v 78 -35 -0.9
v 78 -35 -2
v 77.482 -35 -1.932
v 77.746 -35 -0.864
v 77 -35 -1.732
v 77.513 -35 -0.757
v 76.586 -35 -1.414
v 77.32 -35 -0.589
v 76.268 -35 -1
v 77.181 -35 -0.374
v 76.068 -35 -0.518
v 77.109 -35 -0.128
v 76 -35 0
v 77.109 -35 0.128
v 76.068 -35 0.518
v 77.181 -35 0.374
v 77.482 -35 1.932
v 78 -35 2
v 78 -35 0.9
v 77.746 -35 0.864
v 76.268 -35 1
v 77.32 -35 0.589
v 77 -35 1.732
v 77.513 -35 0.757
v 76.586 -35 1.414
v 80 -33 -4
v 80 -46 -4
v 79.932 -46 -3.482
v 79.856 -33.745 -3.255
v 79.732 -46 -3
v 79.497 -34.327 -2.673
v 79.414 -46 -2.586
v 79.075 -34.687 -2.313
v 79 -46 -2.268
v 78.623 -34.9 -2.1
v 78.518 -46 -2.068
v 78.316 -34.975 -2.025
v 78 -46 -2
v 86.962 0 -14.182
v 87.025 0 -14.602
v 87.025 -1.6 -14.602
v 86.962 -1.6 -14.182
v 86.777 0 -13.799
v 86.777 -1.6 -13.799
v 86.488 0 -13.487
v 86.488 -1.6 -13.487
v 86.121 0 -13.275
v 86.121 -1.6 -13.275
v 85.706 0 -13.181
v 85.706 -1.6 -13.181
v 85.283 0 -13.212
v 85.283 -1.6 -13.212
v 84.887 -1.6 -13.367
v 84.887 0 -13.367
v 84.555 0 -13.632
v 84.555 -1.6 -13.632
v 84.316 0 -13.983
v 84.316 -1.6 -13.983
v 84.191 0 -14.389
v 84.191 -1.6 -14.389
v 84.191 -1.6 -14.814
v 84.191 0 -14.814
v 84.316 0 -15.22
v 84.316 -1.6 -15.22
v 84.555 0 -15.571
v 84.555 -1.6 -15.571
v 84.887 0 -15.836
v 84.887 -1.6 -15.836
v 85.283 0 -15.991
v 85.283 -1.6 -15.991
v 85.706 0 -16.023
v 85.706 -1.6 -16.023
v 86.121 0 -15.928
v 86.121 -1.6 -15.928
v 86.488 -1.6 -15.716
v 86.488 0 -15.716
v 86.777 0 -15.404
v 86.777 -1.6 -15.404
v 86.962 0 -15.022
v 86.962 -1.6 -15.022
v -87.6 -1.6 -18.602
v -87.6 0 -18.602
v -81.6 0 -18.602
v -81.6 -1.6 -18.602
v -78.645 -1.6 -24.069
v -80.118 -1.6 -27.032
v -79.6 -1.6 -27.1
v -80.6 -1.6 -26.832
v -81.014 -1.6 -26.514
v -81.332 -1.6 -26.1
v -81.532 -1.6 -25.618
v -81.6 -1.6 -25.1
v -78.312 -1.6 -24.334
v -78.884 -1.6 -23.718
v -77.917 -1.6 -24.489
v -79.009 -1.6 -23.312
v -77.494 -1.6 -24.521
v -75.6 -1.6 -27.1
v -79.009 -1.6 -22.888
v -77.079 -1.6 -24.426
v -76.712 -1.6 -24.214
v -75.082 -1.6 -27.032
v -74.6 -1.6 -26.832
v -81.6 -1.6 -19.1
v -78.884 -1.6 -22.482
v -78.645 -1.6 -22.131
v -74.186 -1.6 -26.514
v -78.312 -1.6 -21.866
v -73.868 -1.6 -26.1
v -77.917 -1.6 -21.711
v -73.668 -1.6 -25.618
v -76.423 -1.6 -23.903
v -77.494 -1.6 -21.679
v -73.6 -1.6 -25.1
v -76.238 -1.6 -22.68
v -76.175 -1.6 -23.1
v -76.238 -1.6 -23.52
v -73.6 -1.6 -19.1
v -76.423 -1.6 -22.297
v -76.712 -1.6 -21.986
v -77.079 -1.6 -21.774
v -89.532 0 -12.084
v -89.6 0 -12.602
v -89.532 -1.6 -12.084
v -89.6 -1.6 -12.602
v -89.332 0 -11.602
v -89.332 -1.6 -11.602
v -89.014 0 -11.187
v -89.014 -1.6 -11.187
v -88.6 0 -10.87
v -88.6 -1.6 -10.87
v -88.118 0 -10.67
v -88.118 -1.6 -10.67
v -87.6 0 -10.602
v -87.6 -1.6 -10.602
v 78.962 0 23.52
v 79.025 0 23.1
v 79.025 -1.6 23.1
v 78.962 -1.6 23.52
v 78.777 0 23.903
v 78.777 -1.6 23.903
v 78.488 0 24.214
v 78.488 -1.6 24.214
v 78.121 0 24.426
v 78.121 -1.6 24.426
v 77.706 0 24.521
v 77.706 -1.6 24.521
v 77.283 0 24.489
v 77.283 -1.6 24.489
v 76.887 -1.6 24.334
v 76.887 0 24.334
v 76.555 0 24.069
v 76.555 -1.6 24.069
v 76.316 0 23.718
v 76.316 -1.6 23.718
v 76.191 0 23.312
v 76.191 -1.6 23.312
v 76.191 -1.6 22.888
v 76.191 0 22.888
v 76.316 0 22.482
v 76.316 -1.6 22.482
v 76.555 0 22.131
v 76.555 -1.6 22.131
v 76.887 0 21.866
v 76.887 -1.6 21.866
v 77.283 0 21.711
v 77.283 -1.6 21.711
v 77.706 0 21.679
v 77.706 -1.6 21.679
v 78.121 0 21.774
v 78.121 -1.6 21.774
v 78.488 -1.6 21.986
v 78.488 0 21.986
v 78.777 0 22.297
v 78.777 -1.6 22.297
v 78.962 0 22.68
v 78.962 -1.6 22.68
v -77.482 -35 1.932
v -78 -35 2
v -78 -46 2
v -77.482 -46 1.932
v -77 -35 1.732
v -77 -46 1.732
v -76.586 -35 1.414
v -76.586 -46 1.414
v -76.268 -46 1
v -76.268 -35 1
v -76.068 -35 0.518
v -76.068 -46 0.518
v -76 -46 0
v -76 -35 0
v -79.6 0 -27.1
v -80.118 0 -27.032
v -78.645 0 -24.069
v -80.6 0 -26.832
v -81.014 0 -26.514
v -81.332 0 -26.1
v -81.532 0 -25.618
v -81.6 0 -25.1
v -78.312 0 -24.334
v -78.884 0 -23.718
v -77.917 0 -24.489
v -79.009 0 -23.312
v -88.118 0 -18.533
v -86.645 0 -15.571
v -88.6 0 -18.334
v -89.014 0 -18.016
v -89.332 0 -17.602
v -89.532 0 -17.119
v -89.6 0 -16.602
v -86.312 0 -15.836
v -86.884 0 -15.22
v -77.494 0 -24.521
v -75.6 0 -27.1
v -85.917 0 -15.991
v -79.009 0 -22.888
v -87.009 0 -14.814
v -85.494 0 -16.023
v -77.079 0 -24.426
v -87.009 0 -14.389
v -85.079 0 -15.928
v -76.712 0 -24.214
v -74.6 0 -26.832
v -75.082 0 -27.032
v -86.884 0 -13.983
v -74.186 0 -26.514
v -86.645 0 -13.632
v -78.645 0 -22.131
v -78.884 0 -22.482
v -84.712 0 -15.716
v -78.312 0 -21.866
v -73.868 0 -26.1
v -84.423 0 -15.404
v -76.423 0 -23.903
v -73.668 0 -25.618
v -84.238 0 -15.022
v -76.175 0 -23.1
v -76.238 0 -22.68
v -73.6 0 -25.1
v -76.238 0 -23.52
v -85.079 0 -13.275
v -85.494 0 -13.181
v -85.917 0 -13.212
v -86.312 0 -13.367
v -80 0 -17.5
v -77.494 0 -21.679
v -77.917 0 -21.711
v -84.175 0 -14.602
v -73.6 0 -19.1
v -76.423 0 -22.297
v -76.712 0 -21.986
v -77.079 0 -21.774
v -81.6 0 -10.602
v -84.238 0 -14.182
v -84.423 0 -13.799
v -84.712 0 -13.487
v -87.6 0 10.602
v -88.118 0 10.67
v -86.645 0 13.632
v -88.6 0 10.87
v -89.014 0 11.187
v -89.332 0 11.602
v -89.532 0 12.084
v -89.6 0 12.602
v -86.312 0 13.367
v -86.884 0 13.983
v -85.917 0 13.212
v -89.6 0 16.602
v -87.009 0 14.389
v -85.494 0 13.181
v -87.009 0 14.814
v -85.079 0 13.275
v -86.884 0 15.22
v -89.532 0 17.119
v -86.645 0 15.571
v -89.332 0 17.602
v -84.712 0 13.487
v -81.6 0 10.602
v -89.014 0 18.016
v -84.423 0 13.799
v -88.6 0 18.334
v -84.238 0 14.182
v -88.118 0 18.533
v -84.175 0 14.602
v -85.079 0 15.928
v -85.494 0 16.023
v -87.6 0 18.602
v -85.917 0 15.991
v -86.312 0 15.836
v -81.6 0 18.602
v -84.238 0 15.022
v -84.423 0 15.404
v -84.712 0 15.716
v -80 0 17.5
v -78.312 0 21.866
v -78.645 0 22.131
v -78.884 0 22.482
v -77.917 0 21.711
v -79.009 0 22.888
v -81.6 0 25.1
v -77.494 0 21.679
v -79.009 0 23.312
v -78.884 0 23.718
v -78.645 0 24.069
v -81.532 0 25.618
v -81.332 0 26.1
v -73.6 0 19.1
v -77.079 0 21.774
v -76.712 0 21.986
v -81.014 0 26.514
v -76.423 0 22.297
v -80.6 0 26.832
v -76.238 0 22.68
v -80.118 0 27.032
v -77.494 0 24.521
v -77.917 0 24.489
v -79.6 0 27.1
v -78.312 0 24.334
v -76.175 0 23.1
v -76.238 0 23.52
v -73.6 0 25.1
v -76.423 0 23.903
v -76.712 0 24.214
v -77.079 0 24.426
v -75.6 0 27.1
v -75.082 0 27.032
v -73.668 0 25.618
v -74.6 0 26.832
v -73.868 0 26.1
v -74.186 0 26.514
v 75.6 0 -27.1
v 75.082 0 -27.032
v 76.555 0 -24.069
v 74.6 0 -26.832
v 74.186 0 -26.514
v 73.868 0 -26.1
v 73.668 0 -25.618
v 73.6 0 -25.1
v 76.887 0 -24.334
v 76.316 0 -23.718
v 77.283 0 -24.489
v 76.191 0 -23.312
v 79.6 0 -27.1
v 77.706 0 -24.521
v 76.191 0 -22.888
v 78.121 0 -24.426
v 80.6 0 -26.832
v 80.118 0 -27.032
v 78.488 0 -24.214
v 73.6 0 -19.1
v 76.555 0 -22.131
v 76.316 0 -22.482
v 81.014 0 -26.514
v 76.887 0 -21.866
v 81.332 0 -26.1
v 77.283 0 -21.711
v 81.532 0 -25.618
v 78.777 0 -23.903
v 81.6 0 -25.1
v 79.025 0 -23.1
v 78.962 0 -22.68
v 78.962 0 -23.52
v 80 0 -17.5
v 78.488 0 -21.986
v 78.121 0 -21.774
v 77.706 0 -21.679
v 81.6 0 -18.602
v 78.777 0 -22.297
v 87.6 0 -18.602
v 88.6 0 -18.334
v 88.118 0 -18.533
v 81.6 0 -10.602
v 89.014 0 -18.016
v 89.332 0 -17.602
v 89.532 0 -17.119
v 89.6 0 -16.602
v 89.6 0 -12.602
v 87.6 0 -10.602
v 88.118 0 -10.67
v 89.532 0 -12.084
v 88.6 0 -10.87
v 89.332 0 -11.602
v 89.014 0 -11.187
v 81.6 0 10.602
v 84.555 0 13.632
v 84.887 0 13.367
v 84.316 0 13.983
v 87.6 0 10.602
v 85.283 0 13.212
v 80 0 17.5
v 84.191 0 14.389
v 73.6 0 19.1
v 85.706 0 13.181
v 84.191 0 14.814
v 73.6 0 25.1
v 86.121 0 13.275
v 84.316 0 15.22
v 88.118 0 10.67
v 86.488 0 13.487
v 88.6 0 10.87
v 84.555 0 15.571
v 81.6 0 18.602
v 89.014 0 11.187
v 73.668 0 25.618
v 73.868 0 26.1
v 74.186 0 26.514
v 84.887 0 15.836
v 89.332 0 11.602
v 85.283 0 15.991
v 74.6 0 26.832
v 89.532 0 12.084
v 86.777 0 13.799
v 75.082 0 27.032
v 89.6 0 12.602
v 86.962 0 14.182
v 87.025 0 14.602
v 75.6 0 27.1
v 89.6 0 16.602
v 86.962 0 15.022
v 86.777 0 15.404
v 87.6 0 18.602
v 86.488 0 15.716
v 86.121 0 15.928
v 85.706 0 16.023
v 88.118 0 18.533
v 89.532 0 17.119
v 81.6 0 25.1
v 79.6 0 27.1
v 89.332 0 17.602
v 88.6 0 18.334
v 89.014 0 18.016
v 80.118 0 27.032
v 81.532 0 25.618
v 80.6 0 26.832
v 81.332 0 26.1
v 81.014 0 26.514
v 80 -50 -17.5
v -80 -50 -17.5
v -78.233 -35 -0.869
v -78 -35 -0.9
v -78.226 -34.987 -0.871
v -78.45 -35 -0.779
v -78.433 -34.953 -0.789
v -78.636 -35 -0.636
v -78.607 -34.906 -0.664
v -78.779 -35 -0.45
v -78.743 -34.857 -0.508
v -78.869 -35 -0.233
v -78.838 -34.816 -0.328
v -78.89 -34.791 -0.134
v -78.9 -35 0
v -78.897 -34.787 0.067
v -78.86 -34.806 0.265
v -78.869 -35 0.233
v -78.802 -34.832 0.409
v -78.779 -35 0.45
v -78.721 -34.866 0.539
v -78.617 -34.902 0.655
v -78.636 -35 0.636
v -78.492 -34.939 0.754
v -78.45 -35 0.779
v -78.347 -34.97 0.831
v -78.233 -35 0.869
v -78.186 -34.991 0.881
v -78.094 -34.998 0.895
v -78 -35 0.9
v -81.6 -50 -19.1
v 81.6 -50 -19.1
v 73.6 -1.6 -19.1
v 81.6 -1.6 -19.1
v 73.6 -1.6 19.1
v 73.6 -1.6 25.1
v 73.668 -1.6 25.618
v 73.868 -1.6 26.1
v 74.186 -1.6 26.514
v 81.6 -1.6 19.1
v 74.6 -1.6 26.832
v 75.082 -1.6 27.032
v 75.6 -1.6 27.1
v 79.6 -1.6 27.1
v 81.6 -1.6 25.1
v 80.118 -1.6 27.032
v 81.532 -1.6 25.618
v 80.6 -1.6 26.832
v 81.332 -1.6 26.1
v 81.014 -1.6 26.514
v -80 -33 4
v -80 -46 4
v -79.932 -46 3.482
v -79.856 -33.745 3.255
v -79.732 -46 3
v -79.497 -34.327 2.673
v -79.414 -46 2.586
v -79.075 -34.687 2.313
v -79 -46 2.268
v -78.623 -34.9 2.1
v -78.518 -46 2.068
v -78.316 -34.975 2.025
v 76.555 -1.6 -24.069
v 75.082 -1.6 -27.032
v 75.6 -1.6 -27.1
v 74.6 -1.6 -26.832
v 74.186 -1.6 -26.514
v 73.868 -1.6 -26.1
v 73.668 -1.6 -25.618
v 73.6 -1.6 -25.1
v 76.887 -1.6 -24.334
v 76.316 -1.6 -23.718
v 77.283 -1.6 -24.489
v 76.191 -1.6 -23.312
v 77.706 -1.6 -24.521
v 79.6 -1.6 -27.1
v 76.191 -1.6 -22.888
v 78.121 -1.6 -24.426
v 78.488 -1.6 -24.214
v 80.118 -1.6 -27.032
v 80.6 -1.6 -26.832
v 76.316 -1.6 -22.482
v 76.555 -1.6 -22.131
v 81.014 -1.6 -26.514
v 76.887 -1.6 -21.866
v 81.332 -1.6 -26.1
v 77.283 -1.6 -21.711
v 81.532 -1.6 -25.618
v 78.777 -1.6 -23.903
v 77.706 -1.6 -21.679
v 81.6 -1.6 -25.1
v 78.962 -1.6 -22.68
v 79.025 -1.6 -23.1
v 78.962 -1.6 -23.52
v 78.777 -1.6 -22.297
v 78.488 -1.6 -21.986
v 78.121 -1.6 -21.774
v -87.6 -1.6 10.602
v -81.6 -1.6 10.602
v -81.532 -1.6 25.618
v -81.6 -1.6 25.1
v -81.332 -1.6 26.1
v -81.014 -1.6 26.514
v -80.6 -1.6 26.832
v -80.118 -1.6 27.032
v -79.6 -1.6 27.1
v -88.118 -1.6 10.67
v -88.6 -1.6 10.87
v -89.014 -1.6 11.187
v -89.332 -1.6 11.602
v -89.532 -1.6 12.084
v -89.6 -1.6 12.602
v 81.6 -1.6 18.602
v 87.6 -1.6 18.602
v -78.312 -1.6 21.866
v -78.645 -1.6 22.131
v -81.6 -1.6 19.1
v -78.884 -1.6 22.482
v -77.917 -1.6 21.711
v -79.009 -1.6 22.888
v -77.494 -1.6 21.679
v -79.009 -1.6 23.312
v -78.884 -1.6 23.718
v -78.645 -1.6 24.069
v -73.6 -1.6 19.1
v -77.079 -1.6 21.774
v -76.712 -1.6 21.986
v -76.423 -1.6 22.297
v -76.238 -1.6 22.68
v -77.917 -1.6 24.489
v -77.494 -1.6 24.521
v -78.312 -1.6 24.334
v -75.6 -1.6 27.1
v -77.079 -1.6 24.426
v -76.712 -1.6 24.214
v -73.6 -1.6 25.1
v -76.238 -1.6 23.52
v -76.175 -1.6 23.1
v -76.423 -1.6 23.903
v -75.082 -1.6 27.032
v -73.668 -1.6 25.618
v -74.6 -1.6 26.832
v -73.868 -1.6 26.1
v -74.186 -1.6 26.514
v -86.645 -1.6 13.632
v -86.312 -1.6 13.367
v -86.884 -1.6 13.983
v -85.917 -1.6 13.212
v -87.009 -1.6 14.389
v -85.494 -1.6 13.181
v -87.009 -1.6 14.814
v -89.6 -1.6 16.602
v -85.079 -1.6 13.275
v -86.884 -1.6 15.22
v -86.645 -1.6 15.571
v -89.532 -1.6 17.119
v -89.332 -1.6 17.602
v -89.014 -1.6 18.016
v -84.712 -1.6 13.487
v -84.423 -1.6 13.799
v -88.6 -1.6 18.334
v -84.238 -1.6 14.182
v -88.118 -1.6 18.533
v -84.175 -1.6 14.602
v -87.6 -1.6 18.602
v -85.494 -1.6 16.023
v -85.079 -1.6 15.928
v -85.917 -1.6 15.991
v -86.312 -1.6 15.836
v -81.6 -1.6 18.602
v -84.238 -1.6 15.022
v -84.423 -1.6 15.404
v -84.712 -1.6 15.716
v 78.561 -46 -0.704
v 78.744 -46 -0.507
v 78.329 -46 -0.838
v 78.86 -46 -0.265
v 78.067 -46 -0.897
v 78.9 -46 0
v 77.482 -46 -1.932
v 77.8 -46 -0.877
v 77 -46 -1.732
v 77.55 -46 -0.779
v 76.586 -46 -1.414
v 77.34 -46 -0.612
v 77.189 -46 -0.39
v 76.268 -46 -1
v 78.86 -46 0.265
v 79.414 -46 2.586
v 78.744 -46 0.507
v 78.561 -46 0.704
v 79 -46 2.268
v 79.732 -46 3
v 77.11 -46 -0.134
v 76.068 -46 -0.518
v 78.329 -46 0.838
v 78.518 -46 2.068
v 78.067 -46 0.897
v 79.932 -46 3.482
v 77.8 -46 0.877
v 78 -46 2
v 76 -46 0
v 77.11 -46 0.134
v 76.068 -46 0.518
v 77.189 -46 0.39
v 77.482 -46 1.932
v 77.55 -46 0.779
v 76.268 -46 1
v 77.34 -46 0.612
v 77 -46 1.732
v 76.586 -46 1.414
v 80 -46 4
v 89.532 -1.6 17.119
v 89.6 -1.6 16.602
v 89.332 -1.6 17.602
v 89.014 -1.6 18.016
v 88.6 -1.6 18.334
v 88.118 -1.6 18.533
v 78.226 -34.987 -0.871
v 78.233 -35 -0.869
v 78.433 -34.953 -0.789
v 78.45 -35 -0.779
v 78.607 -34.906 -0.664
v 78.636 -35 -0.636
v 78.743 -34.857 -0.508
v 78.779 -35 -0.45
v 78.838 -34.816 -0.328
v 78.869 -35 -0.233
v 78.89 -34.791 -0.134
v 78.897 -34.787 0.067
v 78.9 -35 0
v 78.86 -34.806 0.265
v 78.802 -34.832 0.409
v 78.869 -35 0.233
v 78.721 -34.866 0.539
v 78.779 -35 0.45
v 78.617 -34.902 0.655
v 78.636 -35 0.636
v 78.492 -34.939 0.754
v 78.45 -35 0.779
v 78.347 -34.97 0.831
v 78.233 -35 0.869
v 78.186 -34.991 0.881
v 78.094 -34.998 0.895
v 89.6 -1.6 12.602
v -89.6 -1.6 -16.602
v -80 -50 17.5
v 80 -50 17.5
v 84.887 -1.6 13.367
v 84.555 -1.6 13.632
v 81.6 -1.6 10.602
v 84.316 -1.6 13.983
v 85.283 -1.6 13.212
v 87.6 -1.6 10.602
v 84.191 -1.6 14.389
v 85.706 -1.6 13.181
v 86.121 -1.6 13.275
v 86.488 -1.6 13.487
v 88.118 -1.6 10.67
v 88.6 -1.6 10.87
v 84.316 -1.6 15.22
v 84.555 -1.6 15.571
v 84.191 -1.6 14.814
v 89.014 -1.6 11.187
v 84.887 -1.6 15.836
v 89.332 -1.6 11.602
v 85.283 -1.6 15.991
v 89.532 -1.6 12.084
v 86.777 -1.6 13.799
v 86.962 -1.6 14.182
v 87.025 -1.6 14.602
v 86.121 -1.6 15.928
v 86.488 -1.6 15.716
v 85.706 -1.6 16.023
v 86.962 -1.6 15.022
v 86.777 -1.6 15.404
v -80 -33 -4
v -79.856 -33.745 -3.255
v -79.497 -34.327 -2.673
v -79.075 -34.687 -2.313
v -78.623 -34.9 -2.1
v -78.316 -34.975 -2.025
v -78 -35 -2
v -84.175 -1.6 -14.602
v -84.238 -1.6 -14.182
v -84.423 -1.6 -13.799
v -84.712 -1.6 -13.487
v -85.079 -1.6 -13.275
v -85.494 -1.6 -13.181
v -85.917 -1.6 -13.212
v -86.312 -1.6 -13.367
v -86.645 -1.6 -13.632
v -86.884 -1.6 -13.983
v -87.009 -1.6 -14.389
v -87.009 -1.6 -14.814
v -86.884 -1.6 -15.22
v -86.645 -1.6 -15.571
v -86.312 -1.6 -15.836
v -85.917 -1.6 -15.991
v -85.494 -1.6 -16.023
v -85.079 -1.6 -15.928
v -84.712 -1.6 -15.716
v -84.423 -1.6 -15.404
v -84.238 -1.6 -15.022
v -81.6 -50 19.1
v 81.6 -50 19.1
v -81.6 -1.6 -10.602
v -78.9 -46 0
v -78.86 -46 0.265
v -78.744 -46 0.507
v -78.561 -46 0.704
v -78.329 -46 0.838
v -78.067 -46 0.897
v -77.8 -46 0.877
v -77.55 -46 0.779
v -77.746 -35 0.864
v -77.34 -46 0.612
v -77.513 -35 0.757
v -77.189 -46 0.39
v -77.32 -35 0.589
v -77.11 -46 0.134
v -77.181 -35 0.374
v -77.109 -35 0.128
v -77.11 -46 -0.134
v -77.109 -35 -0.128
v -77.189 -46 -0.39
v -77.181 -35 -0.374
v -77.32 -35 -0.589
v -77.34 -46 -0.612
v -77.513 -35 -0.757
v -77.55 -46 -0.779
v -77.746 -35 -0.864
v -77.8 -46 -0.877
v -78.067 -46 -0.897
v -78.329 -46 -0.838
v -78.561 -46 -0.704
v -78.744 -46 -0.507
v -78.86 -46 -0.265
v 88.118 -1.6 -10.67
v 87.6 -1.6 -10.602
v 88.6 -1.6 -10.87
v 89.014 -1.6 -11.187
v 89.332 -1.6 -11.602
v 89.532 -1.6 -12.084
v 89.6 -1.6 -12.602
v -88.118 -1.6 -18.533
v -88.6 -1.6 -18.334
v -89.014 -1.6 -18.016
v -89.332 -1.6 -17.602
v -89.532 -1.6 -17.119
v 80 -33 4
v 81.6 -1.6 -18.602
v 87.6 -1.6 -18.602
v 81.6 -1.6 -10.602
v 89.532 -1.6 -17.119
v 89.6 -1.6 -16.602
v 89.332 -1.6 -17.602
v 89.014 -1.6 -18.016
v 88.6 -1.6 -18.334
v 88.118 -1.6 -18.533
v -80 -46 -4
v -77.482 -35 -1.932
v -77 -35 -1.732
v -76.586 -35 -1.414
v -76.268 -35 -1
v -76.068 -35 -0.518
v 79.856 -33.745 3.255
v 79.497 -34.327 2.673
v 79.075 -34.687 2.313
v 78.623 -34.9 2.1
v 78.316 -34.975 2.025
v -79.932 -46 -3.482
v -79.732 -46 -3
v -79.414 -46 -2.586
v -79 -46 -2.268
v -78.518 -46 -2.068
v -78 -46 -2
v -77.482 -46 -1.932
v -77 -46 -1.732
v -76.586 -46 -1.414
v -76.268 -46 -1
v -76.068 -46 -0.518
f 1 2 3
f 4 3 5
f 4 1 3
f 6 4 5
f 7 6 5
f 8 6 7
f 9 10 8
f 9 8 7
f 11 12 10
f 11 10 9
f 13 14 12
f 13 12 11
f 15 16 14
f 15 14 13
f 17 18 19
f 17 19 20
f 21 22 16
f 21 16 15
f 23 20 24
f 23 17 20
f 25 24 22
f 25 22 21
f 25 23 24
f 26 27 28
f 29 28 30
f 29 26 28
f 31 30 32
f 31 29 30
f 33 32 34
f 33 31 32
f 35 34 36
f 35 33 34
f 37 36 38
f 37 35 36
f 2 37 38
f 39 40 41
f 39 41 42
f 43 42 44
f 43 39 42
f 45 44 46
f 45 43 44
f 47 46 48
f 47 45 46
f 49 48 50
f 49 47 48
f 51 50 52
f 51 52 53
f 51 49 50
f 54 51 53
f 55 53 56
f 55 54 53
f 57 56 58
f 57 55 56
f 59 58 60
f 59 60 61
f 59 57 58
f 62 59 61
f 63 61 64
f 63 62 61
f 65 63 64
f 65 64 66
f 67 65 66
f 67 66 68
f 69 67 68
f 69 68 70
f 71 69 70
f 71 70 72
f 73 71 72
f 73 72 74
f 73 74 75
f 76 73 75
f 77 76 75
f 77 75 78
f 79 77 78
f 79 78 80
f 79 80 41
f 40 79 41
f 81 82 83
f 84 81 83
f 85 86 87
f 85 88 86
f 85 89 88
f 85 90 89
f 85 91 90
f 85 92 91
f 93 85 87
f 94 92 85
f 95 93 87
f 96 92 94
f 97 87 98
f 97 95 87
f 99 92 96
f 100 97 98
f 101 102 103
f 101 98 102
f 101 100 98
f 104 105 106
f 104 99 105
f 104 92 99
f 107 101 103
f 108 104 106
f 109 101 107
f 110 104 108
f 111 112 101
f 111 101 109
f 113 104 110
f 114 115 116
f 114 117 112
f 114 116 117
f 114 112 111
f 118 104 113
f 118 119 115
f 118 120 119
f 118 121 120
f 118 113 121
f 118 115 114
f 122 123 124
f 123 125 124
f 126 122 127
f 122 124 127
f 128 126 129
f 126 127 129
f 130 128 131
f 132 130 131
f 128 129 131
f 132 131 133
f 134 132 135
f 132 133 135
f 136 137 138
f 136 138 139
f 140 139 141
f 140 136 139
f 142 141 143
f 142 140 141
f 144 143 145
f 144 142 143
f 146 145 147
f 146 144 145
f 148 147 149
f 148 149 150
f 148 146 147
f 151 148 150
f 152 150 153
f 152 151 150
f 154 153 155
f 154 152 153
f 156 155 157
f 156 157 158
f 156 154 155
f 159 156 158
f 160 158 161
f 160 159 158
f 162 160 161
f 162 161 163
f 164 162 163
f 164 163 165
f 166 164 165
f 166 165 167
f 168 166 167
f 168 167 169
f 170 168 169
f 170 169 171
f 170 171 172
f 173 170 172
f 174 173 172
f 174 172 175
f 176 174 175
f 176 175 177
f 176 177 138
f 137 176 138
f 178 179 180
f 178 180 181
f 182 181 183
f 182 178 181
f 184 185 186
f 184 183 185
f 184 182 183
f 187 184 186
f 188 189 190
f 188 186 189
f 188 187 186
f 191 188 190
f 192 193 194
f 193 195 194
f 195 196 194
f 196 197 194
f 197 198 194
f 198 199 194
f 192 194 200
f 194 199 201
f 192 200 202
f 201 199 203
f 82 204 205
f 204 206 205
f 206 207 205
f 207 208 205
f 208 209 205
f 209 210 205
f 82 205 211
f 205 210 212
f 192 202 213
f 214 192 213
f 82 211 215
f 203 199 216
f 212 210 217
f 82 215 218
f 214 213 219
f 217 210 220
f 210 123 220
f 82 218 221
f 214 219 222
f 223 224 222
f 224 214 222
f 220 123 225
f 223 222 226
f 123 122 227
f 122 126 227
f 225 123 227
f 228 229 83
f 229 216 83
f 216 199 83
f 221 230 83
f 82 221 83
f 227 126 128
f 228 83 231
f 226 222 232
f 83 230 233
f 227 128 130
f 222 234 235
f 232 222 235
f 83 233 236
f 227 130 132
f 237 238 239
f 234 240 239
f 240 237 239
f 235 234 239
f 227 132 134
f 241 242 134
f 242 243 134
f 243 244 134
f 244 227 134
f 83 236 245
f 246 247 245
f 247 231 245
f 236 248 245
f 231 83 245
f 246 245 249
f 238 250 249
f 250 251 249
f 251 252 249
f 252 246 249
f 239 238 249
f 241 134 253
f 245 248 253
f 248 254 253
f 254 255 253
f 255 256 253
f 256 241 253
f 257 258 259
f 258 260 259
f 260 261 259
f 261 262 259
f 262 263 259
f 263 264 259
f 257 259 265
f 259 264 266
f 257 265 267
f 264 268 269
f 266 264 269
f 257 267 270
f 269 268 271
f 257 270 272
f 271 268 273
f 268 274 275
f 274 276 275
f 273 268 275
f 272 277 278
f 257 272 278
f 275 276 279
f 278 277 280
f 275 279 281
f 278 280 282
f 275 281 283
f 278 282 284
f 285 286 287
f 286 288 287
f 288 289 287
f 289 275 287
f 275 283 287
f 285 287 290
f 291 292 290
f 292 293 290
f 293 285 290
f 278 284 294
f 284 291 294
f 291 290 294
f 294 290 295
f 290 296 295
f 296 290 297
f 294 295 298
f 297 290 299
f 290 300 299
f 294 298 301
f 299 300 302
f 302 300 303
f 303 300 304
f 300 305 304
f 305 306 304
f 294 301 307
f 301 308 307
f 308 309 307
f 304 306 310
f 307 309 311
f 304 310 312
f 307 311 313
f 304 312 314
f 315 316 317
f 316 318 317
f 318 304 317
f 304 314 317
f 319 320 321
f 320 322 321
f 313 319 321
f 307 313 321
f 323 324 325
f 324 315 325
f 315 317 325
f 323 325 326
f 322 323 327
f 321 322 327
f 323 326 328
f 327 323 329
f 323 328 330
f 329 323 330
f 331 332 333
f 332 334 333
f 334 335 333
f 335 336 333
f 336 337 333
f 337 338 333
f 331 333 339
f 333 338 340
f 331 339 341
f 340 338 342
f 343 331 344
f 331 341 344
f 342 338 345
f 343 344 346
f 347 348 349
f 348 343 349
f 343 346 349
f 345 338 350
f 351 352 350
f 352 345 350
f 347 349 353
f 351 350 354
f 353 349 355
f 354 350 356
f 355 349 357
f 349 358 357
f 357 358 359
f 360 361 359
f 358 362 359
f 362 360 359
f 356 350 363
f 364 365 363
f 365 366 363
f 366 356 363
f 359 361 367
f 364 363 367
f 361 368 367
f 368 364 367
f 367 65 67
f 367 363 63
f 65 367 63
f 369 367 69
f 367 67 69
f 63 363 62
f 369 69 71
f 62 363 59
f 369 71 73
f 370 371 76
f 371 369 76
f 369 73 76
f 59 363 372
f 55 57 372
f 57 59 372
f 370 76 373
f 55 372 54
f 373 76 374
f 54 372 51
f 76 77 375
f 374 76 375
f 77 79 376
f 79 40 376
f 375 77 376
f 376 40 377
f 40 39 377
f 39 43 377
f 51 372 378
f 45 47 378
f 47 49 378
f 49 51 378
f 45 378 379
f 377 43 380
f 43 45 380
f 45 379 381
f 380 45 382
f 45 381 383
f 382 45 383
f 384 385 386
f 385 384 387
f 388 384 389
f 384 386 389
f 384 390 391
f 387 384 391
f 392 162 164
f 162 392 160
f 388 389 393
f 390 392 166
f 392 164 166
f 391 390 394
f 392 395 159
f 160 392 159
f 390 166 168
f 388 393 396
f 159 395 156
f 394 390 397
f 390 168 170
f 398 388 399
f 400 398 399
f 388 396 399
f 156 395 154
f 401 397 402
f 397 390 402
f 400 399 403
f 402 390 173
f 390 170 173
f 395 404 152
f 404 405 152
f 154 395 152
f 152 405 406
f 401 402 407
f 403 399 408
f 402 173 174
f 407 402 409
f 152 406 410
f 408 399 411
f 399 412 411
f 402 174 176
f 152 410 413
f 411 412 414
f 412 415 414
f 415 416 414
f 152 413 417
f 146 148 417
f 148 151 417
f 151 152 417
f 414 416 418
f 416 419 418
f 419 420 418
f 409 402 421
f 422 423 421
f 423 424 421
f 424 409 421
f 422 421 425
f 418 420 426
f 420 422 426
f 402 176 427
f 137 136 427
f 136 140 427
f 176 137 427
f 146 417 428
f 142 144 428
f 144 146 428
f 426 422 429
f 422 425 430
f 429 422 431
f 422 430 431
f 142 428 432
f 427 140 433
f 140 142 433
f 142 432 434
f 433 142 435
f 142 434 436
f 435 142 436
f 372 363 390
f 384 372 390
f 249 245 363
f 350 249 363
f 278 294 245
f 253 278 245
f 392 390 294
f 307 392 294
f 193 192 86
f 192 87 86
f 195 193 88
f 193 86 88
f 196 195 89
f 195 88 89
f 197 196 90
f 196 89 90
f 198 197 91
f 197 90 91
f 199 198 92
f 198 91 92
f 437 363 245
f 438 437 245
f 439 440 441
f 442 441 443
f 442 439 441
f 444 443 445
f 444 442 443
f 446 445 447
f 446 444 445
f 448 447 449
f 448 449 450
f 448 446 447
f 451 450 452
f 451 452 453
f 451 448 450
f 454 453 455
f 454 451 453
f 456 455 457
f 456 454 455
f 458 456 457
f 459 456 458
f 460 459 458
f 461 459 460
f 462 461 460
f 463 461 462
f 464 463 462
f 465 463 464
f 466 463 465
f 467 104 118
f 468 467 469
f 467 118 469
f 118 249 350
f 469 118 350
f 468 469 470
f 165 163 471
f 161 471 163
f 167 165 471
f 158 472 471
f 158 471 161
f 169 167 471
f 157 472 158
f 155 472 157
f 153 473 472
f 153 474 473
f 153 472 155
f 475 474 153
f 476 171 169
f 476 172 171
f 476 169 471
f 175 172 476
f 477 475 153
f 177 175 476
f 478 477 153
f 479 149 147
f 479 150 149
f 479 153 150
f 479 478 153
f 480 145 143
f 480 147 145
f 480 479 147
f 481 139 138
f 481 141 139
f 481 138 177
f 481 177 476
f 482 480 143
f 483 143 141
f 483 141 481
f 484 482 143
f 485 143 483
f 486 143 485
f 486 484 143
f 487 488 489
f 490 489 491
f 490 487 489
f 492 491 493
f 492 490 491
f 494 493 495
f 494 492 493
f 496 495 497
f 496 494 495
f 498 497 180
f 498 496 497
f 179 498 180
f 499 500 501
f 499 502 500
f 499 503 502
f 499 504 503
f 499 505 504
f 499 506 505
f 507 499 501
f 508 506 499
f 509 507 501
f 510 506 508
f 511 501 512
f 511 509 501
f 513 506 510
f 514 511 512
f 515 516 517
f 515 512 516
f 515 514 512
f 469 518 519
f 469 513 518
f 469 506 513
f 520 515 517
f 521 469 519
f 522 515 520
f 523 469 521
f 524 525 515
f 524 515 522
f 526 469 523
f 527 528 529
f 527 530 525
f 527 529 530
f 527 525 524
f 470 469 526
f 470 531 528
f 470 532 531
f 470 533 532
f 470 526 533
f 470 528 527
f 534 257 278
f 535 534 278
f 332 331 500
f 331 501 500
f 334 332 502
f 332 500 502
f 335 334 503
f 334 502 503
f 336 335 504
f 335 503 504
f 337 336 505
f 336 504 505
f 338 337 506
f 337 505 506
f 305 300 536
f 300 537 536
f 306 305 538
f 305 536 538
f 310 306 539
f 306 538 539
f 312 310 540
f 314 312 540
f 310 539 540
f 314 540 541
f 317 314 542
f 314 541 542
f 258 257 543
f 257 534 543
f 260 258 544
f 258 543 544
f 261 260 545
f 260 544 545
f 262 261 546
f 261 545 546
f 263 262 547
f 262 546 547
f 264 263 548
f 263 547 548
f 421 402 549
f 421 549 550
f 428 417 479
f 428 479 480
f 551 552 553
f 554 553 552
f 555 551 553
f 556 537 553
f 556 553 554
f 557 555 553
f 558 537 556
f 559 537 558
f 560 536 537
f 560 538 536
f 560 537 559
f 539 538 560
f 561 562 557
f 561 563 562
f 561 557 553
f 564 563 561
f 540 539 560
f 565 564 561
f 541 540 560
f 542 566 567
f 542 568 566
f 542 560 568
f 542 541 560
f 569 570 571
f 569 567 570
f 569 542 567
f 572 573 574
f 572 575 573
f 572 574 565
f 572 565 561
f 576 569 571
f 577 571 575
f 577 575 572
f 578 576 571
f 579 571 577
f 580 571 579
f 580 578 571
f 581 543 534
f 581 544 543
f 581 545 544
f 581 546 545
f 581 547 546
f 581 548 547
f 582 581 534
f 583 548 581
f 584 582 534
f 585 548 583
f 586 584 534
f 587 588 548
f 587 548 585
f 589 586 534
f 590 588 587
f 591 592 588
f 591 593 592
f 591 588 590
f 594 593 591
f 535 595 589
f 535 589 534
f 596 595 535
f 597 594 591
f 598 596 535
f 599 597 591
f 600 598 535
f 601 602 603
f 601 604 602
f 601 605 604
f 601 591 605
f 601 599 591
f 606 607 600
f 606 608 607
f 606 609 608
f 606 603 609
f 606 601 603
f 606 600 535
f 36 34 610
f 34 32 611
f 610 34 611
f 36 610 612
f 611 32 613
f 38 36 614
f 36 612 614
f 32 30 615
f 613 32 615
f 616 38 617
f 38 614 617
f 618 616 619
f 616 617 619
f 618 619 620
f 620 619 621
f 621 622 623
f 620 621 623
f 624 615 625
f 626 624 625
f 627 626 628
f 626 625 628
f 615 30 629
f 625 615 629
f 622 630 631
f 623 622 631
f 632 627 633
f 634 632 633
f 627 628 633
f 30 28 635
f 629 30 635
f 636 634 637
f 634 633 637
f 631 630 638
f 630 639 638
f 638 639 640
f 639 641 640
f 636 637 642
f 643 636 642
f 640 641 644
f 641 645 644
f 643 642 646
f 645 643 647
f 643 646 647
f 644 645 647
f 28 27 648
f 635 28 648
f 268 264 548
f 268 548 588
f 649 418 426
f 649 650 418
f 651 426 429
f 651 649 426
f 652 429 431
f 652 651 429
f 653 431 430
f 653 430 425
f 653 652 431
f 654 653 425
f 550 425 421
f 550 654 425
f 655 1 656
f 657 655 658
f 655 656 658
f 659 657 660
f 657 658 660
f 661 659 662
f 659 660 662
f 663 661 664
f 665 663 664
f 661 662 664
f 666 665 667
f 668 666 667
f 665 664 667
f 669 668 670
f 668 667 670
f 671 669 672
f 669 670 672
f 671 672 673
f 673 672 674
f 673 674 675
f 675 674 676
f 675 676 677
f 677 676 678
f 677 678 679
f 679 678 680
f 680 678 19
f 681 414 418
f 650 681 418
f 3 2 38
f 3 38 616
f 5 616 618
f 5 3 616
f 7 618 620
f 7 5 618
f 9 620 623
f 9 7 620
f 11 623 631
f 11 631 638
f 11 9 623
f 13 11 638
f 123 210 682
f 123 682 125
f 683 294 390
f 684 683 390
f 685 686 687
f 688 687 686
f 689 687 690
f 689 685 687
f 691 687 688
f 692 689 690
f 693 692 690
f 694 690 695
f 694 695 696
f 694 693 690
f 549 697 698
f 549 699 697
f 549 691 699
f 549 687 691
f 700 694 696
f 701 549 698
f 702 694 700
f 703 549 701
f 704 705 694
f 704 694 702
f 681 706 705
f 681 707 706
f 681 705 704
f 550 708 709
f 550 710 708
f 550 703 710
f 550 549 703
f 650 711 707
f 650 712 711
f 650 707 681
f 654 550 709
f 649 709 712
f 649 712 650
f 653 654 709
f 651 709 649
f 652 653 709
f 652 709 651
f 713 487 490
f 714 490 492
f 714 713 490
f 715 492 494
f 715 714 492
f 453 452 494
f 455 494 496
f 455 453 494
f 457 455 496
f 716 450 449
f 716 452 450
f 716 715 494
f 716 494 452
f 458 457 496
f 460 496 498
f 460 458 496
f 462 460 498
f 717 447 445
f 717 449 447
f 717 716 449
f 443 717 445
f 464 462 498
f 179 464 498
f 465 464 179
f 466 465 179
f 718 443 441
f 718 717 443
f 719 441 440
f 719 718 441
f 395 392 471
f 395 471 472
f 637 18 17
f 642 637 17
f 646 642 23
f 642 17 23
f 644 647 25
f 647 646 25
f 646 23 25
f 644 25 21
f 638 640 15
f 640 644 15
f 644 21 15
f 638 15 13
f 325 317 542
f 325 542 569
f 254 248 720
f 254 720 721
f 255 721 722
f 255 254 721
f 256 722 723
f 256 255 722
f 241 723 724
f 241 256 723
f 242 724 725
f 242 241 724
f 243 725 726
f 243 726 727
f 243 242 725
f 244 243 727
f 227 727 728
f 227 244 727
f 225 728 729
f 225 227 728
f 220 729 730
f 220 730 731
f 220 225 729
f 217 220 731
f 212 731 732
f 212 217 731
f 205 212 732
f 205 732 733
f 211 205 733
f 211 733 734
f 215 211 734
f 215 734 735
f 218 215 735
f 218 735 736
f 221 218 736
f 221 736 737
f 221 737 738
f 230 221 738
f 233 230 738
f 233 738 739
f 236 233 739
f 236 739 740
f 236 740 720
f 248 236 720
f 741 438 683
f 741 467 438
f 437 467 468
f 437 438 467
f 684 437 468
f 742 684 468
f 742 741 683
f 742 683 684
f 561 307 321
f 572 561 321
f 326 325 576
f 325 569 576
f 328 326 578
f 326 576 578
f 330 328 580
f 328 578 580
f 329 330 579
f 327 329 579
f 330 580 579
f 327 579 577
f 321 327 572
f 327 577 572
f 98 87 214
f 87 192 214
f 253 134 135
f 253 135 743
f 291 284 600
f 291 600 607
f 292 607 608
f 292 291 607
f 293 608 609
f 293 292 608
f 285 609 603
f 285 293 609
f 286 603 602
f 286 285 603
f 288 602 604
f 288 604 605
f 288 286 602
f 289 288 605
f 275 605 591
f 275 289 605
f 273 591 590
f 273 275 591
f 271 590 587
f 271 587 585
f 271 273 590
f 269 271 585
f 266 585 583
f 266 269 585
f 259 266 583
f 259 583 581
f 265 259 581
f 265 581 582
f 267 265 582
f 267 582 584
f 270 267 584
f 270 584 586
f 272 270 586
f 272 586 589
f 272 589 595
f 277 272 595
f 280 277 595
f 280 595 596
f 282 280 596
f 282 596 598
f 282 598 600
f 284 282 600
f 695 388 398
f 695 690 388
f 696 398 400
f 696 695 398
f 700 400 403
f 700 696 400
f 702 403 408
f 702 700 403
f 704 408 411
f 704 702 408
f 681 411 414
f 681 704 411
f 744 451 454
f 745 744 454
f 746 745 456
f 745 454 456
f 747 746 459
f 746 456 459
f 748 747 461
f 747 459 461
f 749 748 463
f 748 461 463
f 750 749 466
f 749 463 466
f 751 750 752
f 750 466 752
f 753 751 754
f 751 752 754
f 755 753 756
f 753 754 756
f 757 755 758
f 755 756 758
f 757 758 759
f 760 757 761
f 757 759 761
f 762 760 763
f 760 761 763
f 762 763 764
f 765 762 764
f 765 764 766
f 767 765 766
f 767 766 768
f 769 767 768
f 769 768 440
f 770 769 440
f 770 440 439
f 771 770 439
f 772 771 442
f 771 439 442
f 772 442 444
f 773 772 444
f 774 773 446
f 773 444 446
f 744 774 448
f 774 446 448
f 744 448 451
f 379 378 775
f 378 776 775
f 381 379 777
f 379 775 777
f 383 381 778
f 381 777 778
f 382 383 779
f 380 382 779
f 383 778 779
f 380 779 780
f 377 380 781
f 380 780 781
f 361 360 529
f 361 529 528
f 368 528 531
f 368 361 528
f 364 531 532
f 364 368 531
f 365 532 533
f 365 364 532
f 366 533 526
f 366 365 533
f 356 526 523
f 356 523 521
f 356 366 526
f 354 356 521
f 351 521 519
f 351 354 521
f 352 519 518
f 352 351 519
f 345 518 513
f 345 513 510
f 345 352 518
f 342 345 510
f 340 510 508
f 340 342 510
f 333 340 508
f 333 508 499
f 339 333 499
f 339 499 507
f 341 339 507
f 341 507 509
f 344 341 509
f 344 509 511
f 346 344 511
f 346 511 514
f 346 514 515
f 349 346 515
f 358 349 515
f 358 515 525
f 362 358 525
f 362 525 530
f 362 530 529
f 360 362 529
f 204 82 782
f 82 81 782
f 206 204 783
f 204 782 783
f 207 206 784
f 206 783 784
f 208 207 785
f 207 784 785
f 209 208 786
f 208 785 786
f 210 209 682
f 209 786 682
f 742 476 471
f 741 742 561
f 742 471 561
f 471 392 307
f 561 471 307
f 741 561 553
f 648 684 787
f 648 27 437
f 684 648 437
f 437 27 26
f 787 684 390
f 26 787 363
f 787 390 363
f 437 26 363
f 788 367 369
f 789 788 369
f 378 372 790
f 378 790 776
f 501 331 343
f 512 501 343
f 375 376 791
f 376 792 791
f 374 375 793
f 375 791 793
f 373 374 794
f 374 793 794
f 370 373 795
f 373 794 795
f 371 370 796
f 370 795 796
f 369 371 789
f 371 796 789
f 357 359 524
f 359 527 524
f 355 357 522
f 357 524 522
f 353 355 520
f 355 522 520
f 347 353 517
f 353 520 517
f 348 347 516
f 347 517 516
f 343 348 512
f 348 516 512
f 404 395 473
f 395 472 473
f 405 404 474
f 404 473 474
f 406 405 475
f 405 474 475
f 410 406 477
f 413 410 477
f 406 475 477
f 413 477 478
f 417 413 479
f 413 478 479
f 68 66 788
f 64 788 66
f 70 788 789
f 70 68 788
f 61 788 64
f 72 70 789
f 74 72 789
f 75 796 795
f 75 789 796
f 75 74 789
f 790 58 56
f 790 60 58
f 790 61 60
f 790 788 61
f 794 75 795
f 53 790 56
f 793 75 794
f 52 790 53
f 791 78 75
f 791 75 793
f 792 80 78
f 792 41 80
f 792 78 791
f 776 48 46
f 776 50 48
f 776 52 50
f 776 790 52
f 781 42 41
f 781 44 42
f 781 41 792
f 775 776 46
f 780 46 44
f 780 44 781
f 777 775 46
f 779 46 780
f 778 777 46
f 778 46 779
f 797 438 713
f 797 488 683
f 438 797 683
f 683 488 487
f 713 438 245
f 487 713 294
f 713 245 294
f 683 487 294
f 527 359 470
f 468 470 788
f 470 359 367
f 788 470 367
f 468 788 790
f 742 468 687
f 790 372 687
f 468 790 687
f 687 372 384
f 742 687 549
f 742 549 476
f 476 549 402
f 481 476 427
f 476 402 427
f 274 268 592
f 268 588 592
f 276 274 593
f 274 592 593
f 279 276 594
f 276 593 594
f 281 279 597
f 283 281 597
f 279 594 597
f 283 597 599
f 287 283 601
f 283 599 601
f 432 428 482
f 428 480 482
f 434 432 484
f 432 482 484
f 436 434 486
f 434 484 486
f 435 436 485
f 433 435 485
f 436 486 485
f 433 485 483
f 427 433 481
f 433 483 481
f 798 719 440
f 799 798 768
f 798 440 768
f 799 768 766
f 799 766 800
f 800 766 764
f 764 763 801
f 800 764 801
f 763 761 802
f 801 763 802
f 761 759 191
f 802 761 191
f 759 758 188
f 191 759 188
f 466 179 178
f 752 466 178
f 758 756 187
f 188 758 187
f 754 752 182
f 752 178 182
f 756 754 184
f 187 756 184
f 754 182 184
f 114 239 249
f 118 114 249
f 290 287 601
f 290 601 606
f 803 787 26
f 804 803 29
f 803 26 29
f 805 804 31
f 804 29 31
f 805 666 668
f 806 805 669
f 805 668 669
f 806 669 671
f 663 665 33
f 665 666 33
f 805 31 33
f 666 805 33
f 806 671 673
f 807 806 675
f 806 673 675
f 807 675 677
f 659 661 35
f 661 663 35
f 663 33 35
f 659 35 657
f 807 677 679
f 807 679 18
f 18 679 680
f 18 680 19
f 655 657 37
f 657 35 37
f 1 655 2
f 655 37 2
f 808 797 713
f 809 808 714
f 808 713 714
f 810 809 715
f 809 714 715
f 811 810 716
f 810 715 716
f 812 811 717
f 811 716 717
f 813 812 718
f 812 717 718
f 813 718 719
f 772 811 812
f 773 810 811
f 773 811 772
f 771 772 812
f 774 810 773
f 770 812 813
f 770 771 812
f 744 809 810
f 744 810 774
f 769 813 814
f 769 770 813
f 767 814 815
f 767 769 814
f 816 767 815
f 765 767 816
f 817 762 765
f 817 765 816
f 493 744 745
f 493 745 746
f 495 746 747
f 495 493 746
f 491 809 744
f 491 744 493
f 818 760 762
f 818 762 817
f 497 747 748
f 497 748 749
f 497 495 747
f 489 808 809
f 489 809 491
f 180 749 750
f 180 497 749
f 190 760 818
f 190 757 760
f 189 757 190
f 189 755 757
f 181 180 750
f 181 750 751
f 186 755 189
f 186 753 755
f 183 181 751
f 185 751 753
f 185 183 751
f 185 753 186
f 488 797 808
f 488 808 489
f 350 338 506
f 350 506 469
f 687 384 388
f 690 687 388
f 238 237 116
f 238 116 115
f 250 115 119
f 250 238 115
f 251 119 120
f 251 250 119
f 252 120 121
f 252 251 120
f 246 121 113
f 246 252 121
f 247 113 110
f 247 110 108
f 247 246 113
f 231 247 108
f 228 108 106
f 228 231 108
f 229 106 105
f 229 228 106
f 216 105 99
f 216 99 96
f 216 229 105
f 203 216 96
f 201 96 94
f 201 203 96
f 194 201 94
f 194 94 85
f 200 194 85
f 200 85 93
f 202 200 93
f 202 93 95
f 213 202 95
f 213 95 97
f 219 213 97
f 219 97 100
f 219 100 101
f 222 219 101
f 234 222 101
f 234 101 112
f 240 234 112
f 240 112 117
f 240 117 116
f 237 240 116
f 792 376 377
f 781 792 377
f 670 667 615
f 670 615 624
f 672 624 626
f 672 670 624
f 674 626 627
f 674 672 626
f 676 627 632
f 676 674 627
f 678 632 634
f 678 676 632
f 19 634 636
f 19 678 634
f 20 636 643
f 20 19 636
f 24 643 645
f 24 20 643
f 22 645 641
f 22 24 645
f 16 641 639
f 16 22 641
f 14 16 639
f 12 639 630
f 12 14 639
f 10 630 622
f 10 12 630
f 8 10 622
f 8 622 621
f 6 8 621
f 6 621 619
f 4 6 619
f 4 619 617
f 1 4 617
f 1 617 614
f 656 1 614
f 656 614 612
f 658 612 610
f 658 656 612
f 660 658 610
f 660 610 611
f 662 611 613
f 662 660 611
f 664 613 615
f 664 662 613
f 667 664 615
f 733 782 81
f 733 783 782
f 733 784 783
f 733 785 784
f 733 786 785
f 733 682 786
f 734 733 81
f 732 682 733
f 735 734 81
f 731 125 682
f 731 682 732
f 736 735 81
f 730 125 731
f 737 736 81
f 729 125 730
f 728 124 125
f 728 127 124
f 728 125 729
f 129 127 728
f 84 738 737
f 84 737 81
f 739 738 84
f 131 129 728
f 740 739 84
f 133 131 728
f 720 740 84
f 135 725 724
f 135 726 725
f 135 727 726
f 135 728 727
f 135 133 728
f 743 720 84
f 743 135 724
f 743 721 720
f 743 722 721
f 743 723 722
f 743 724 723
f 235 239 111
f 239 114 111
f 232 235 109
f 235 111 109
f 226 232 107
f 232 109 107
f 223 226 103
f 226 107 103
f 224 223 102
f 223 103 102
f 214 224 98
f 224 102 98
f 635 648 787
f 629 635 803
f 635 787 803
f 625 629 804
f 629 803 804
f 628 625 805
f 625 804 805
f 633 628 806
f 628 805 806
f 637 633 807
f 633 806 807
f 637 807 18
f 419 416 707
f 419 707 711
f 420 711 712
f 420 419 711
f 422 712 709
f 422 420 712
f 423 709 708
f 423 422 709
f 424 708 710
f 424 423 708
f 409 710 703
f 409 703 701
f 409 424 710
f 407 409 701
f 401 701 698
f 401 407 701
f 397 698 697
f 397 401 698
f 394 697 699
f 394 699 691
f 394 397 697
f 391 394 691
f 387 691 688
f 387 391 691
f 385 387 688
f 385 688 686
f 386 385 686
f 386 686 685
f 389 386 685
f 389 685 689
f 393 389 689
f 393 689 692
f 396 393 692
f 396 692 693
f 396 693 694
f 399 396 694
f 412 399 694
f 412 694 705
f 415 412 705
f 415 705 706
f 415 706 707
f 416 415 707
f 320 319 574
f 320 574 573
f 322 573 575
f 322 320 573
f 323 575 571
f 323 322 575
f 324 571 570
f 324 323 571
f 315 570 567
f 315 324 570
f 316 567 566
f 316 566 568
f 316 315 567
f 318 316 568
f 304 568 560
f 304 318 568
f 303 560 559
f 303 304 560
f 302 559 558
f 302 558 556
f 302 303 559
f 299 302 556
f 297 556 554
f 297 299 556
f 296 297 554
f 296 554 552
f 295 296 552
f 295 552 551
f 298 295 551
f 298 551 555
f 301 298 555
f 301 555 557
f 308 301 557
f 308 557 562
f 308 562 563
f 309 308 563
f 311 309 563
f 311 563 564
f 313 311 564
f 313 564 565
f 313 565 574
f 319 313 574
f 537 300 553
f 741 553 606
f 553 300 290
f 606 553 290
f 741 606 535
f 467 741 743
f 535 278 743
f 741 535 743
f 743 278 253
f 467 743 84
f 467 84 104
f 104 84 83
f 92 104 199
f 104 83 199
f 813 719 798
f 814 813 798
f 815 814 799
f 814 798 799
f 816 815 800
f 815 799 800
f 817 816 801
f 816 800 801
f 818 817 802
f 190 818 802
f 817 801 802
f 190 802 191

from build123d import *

# Parameters (mm, degrees)
F1_DEPTH     = 50
F0_W         = 8
F0_H         = 8
F0_R         = 1.425
F2_DEPTH     = 1.6
F3_R         = 2
F5_R         = 2
F6_START     = 35
F0_W_2       = 4
F0_H_2       = 4
F0_R_2       = 0.9
F6_DEPTH     = 11
F7_T1_DEPTH  = 11
F7_T6_DEPTH  = 4
F7_S7_R      = 0.9
F7_T8_DEPTH  = 4
F7_T13_DEPTH = 9
F7_T17_DEPTH = 16
F7_T24_DEPTH = 9
F7_T28_DEPTH = 16
F7_T31_DEPTH = 21
F9_R         = 2


# Not quite as in the source:
# - a fillet or chamfer that OpenCascade refuses, or shapes differently, is made with other operations: its cross-section is extruded or revolved along the edge and cut away or added


with BuildPart() as f1:
    # F0 (on Front) → F1 (new body)
    with BuildSketch(Plane.XZ):
        Polygon((-81.6, -18.6015841149), (-81.6, -19.1), (-73.6, -19.1), (73.6, -19.1), (81.6, -19.1), (81.6, -18.6015841149), (81.6, -10.6015841149), (81.6, 10.6015841149), (81.6, 18.6015841149), (81.6, 19.1), (73.6, 19.1), (-73.6, 19.1), (-81.6, 19.1), (-81.6, 18.6015841149), (-81.6, 10.6015841149), (-81.6, -10.6015841149), align=None)
        Polygon((80, -2), (80, -17.5), (-80, -17.5), (-80, 17.5), (80, 17.5), (80, 2), align=None, mode=Mode.SUBTRACT)
    extrude(amount=F1_DEPTH)

    # F0 (on Front) → F2 (join)
    with BuildSketch(Plane.XZ):
        Polygon((-81.6, -18.6015841149), (-81.6, -19.1), (-73.6, -19.1), (73.6, -19.1), (81.6, -19.1), (81.6, -18.6015841149), (81.6, -10.6015841149), (81.6, 10.6015841149), (81.6, 18.6015841149), (81.6, 19.1), (73.6, 19.1), (-73.6, 19.1), (-81.6, 19.1), (-81.6, 18.6015841149), (-81.6, 10.6015841149), (-81.6, -10.6015841149), align=None)
        Polygon((80, -2), (80, -17.5), (-80, -17.5), (-80, 17.5), (80, 17.5), (80, 2), align=None, mode=Mode.SUBTRACT)
        with Locations((-77.6, -23.1)):
            Rectangle(F0_W, F0_H)
        with Locations((-77.6, -23.1)):
            Circle(F0_R, mode=Mode.SUBTRACT)
        with Locations((-85.6, -14.6015841149)):
            Rectangle(F0_W, F0_H)
        with Locations((-85.6, -14.6015841149)):
            Circle(F0_R, mode=Mode.SUBTRACT)
        with Locations((77.6, -23.1)):
            Rectangle(F0_W, F0_H)
        with Locations((77.6, -23.1)):
            Circle(F0_R, mode=Mode.SUBTRACT)
        with Locations((-85.6, 14.6015841149)):
            Rectangle(F0_W, F0_H)
        with Locations((-85.6, 14.6015841149)):
            Circle(F0_R, mode=Mode.SUBTRACT)
        with Locations((85.6, -14.6015841149)):
            Rectangle(F0_W, F0_H)
        with Locations((85.6, -14.6015841149)):
            Circle(F0_R, mode=Mode.SUBTRACT)
        with Locations((-77.6, 23.1)):
            Rectangle(F0_W, F0_H)
        with Locations((-77.6, 23.1)):
            Circle(F0_R, mode=Mode.SUBTRACT)
        with Locations((85.6, 14.6015841149)):
            Rectangle(F0_W, F0_H)
        with Locations((85.6, 14.6015841149)):
            Circle(F0_R, mode=Mode.SUBTRACT)
        with Locations((77.6, 23.1)):
            Rectangle(F0_W, F0_H)
        with Locations((77.6, 23.1)):
            Circle(F0_R, mode=Mode.SUBTRACT)
    extrude(amount=F2_DEPTH)

    # F3
    f3_edges = [f1.edges().sort_by_distance(p)[0] for p in [
        (-81.6, -0.8, 27.1),
        (-73.6, -0.8, 27.1),
        (73.6, -0.8, 27.1),
        (81.6, -0.8, 27.1),
        (89.6, -0.8, -10.601584),
        (89.6, -0.8, -18.601584),
        (81.6, -0.8, -27.1),
        (73.6, -0.8, -27.1),
        (-89.6, -0.8, -18.601584),
        (-89.6, -0.8, -10.601584),
        (-81.6, -0.8, -27.1),
    ]]
    fillet(f3_edges, radius=F3_R)

    # F4: F1 across plane


with BuildPart() as f1_1:
    add(f1.part)
    add(f1.part.mirror(Plane.YZ))

    # F5
    f5_edges = [f1_1.edges().sort_by_distance(p)[0] for p in [
        (-73.6, -0.8, -27.1),
        (73.6, -0.8, -27.1),
    ]]
    fillet(f5_edges, radius=F5_R)

    # F0 (on Front) → F6 (join)
    with BuildSketch(Plane.XZ.offset(F6_START)):
        with Locations((78, 0)):
            Rectangle(F0_W_2, F0_H_2)
        with Locations((78, 0)):
            Circle(F0_R_2, mode=Mode.SUBTRACT)
    extrude(amount=F6_DEPTH)

    # F7: fillet of radius 2 on 5 edges, made by hand

    # F7_s2 → F7_t1 (join)
    with BuildSketch(Plane.XZ.offset(35)):
        with BuildLine():
            ThreePointArc((80, -4), (79.4142135624, -2.5857864376), (78, -2))
            Line((78, -2), (80, -2))
            Line((80, -2), (80, -4))
        make_face()
        with BuildLine():
            ThreePointArc((80, 4), (79.4142135624, 2.5857864376), (78, 2))
            Line((78, 2), (80, 2))
            Line((80, 2), (80, 4))
        make_face()
    extrude(amount=F7_T1_DEPTH)


with BuildPart() as f7_tool4:
    # F7_s5 → F7_t6 (new body)
    with BuildSketch(Plane.XY.offset(-2)):
        with BuildLine():
            ThreePointArc((80, -33), (79.4142135624, -34.4142135624), (78, -35))
            Line((78, -35), (80, -35))
            Line((80, -35), (80, -33))
        make_face()
    extrude(amount=F7_T6_DEPTH)

    # F7_s7 → F7_t8 (cut, symmetric)
    with BuildSketch(Plane.XZ.offset(34)):
        with Locations((78, 0)):
            Circle(F7_S7_R)
    extrude(amount=F7_T8_DEPTH, both=True, mode=Mode.SUBTRACT)


with BuildPart() as f1_2:
    add(f1_1.part)

    # F7_t3: union F7_tool4
    add(f7_tool4.part)


with BuildPart() as f7_tool11:
    # F7_s12 → F7_t13 (new body)
    with BuildSketch(Plane.XY.offset(-7)):
        with BuildLine():
            ThreePointArc((80, -33), (79.4142135624, -34.4142135624), (78, -35))
            Line((78, -35), (80, -35))
            Line((80, -35), (80, -33))
        make_face()
    extrude(amount=F7_T13_DEPTH)

    split(bisect_by=Plane.XY.offset(-2), keep=Keep.BOTTOM)


with BuildPart() as f7_tool15:
    # F7_s16 → F7_t17 (new body)
    with BuildSketch(Plane.XZ.offset(30)):
        with BuildLine():
            ThreePointArc((80, -4), (79.4142135624, -2.5857864376), (78, -2))
            Line((78, -2), (80, -2))
            Line((80, -2), (80, -4))
        make_face()
    extrude(amount=F7_T17_DEPTH)

    split(bisect_by=Plane.XZ.offset(35), keep=Keep.BOTTOM)


with BuildPart() as f7_tool11_1:
    add(f7_tool11.part)

    # F7_t19: intersect F7_tool15
    add(f7_tool15.part, mode=Mode.INTERSECT)


with BuildPart() as f1_3:
    add(f1_2.part)

    # F7_t9: union F7_tool11
    add(f7_tool11_1.part)


with BuildPart() as f7_tool22:
    # F7_s23 → F7_t24 (new body)
    with BuildSketch(Plane.XY.offset(-2)):
        with BuildLine():
            ThreePointArc((80, -33), (79.4142135624, -34.4142135624), (78, -35))
            Line((78, -35), (80, -35))
            Line((80, -35), (80, -33))
        make_face()
    extrude(amount=F7_T24_DEPTH)

    split(bisect_by=Plane.XY.offset(2), keep=Keep.TOP)


with BuildPart() as f7_tool26:
    # F7_s27 → F7_t28 (new body)
    with BuildSketch(Plane.XZ.offset(30)):
        with BuildLine():
            ThreePointArc((80, 4), (79.4142135624, 2.5857864376), (78, 2))
            Line((78, 2), (80, 2))
            Line((80, 2), (80, 4))
        make_face()
    extrude(amount=F7_T28_DEPTH)

    split(bisect_by=Plane.XZ.offset(35), keep=Keep.BOTTOM)


with BuildPart() as f7_tool22_1:
    add(f7_tool22.part)

    # F7_t30: intersect F7_tool26
    add(f7_tool26.part, mode=Mode.INTERSECT)


with BuildPart() as f1_4:
    add(f1_3.part)

    # F7_t20: union F7_tool22
    add(f7_tool22_1.part)

    # F7_s32 → F7_t31 (cut)
    with BuildSketch(Plane.XZ.offset(30)):
        with BuildLine():
            ThreePointArc((78, -2), (76.5857864376, -1.4142135624), (76, 0))
            Line((76, 0), (76, -2))
            Line((76, -2), (78, -2))
        make_face()
        with BuildLine():
            ThreePointArc((78, 2), (76.5857864376, 1.4142135624), (76, 0))
            Line((76, 0), (76, 2))
            Line((76, 2), (78, 2))
        make_face()
    extrude(amount=F7_T31_DEPTH, mode=Mode.SUBTRACT)

    # F8: F1 across plane


with BuildPart() as f1_5:
    add(f1_4.part)
    add(f1_4.part.mirror(Plane.YZ))

    # F9
    f9_edges = [f1_5.edges().sort_by_distance(p)[0] for p in [
        (89.6, -0.8, 10.601584),
        (89.6, -0.8, 18.601584),
        (-89.6, -0.8, 10.601584),
        (-89.6, -0.8, 18.601584),
    ]]
    fillet(f9_edges, radius=F9_R)


solid = f1_5.part
